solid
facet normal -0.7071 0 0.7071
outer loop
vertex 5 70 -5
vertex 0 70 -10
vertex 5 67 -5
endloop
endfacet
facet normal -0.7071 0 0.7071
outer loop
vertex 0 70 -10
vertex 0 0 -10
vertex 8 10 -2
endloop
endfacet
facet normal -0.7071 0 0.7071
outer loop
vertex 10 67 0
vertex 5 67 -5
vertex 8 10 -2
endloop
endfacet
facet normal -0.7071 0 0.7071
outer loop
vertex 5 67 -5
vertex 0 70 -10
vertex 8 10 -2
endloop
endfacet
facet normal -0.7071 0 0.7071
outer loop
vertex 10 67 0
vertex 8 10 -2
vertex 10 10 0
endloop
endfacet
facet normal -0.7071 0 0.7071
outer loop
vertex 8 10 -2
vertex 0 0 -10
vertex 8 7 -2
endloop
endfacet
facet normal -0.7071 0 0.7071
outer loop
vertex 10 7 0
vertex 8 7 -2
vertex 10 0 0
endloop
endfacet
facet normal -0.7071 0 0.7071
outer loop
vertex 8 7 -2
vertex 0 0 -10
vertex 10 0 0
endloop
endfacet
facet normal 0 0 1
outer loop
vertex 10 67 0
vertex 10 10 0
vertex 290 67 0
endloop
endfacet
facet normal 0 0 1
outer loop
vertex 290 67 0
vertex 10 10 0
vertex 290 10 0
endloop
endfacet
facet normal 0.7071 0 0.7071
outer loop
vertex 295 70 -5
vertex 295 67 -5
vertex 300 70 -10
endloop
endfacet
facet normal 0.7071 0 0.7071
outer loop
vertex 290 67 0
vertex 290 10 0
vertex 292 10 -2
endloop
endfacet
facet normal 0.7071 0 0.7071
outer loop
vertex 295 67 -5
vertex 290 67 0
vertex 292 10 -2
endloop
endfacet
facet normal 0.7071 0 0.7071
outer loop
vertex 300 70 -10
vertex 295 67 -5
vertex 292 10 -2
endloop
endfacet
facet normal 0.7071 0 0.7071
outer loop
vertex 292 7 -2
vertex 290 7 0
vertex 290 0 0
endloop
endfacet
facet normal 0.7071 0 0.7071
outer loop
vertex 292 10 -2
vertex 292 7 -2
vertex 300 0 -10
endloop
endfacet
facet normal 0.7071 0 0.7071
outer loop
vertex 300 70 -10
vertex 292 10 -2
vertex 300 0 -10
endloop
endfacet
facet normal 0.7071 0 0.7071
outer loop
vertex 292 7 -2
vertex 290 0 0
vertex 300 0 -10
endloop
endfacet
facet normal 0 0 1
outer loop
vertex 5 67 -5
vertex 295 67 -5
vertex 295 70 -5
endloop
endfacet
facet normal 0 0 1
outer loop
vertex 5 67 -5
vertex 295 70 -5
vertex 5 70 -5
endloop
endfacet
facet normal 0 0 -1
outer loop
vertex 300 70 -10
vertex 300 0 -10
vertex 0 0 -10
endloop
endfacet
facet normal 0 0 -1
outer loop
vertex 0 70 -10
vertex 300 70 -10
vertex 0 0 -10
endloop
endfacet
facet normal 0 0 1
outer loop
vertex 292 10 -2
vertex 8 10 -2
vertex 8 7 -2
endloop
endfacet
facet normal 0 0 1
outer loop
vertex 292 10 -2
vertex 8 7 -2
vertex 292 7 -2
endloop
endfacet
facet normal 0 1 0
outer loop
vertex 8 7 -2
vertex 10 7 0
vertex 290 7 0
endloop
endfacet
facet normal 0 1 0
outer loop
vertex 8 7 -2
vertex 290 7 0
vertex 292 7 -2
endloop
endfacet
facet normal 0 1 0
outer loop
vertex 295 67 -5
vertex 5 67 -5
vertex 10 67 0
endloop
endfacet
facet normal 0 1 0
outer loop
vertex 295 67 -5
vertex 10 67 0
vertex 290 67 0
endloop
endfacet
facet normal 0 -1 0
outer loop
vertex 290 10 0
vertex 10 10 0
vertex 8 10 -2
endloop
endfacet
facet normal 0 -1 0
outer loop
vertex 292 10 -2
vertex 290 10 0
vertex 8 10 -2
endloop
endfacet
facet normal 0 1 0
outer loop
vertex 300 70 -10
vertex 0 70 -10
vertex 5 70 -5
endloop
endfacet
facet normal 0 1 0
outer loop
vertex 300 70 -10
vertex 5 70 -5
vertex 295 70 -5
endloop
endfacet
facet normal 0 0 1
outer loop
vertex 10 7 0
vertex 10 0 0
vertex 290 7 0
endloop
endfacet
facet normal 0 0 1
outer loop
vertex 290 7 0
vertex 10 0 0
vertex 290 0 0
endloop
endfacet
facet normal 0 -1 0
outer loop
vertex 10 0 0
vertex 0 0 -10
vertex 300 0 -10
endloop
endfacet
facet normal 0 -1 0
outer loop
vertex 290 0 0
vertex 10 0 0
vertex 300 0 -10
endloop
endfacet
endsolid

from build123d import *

# Parameters (mm, degrees)
BOSS_EXTRUDE1_DEPTH     = 70
CUT_EXTRUDE1_DEPTH      = 309.220700148
CUT_EXTRUDE1_DEPTH_BACK = 3
SKETCH3_W               = 300
SKETCH3_H               = 3
CUT_EXTRUDE2_DEPTH      = 2


with BuildPart() as part:
    # Sketch1 → Boss-Extrude1 (new body)
    with BuildSketch(Plane(origin=(0, 0, 0), x_dir=(1, 0, 0), z_dir=(0, 1, 0))):
        Polygon((0, 10), (10, 0), (290, 0), (300, 10), align=None)
    extrude(amount=BOSS_EXTRUDE1_DEPTH)

    # Sketch2 → Cut-Extrude1 (cut, two sides: drawn at the far end of the back side and taken through both)
    with BuildSketch(Plane(origin=(0, 70, 0), x_dir=(1, 0, 0), z_dir=(0, 1, 0)).offset(-CUT_EXTRUDE1_DEPTH_BACK)):
        Polygon((295, 5), (5, 5), (10, 0), (290, 0), align=None)
    extrude(amount=CUT_EXTRUDE1_DEPTH + CUT_EXTRUDE1_DEPTH_BACK, mode=Mode.SUBTRACT)

    # Sketch3 → Cut-Extrude2 (cut)
    with BuildSketch(Plane.XY):
        with Locations((150, 8.5)):
            Rectangle(SKETCH3_W, SKETCH3_H)
    extrude(amount=-CUT_EXTRUDE2_DEPTH, mode=Mode.SUBTRACT)


solid = part.part
